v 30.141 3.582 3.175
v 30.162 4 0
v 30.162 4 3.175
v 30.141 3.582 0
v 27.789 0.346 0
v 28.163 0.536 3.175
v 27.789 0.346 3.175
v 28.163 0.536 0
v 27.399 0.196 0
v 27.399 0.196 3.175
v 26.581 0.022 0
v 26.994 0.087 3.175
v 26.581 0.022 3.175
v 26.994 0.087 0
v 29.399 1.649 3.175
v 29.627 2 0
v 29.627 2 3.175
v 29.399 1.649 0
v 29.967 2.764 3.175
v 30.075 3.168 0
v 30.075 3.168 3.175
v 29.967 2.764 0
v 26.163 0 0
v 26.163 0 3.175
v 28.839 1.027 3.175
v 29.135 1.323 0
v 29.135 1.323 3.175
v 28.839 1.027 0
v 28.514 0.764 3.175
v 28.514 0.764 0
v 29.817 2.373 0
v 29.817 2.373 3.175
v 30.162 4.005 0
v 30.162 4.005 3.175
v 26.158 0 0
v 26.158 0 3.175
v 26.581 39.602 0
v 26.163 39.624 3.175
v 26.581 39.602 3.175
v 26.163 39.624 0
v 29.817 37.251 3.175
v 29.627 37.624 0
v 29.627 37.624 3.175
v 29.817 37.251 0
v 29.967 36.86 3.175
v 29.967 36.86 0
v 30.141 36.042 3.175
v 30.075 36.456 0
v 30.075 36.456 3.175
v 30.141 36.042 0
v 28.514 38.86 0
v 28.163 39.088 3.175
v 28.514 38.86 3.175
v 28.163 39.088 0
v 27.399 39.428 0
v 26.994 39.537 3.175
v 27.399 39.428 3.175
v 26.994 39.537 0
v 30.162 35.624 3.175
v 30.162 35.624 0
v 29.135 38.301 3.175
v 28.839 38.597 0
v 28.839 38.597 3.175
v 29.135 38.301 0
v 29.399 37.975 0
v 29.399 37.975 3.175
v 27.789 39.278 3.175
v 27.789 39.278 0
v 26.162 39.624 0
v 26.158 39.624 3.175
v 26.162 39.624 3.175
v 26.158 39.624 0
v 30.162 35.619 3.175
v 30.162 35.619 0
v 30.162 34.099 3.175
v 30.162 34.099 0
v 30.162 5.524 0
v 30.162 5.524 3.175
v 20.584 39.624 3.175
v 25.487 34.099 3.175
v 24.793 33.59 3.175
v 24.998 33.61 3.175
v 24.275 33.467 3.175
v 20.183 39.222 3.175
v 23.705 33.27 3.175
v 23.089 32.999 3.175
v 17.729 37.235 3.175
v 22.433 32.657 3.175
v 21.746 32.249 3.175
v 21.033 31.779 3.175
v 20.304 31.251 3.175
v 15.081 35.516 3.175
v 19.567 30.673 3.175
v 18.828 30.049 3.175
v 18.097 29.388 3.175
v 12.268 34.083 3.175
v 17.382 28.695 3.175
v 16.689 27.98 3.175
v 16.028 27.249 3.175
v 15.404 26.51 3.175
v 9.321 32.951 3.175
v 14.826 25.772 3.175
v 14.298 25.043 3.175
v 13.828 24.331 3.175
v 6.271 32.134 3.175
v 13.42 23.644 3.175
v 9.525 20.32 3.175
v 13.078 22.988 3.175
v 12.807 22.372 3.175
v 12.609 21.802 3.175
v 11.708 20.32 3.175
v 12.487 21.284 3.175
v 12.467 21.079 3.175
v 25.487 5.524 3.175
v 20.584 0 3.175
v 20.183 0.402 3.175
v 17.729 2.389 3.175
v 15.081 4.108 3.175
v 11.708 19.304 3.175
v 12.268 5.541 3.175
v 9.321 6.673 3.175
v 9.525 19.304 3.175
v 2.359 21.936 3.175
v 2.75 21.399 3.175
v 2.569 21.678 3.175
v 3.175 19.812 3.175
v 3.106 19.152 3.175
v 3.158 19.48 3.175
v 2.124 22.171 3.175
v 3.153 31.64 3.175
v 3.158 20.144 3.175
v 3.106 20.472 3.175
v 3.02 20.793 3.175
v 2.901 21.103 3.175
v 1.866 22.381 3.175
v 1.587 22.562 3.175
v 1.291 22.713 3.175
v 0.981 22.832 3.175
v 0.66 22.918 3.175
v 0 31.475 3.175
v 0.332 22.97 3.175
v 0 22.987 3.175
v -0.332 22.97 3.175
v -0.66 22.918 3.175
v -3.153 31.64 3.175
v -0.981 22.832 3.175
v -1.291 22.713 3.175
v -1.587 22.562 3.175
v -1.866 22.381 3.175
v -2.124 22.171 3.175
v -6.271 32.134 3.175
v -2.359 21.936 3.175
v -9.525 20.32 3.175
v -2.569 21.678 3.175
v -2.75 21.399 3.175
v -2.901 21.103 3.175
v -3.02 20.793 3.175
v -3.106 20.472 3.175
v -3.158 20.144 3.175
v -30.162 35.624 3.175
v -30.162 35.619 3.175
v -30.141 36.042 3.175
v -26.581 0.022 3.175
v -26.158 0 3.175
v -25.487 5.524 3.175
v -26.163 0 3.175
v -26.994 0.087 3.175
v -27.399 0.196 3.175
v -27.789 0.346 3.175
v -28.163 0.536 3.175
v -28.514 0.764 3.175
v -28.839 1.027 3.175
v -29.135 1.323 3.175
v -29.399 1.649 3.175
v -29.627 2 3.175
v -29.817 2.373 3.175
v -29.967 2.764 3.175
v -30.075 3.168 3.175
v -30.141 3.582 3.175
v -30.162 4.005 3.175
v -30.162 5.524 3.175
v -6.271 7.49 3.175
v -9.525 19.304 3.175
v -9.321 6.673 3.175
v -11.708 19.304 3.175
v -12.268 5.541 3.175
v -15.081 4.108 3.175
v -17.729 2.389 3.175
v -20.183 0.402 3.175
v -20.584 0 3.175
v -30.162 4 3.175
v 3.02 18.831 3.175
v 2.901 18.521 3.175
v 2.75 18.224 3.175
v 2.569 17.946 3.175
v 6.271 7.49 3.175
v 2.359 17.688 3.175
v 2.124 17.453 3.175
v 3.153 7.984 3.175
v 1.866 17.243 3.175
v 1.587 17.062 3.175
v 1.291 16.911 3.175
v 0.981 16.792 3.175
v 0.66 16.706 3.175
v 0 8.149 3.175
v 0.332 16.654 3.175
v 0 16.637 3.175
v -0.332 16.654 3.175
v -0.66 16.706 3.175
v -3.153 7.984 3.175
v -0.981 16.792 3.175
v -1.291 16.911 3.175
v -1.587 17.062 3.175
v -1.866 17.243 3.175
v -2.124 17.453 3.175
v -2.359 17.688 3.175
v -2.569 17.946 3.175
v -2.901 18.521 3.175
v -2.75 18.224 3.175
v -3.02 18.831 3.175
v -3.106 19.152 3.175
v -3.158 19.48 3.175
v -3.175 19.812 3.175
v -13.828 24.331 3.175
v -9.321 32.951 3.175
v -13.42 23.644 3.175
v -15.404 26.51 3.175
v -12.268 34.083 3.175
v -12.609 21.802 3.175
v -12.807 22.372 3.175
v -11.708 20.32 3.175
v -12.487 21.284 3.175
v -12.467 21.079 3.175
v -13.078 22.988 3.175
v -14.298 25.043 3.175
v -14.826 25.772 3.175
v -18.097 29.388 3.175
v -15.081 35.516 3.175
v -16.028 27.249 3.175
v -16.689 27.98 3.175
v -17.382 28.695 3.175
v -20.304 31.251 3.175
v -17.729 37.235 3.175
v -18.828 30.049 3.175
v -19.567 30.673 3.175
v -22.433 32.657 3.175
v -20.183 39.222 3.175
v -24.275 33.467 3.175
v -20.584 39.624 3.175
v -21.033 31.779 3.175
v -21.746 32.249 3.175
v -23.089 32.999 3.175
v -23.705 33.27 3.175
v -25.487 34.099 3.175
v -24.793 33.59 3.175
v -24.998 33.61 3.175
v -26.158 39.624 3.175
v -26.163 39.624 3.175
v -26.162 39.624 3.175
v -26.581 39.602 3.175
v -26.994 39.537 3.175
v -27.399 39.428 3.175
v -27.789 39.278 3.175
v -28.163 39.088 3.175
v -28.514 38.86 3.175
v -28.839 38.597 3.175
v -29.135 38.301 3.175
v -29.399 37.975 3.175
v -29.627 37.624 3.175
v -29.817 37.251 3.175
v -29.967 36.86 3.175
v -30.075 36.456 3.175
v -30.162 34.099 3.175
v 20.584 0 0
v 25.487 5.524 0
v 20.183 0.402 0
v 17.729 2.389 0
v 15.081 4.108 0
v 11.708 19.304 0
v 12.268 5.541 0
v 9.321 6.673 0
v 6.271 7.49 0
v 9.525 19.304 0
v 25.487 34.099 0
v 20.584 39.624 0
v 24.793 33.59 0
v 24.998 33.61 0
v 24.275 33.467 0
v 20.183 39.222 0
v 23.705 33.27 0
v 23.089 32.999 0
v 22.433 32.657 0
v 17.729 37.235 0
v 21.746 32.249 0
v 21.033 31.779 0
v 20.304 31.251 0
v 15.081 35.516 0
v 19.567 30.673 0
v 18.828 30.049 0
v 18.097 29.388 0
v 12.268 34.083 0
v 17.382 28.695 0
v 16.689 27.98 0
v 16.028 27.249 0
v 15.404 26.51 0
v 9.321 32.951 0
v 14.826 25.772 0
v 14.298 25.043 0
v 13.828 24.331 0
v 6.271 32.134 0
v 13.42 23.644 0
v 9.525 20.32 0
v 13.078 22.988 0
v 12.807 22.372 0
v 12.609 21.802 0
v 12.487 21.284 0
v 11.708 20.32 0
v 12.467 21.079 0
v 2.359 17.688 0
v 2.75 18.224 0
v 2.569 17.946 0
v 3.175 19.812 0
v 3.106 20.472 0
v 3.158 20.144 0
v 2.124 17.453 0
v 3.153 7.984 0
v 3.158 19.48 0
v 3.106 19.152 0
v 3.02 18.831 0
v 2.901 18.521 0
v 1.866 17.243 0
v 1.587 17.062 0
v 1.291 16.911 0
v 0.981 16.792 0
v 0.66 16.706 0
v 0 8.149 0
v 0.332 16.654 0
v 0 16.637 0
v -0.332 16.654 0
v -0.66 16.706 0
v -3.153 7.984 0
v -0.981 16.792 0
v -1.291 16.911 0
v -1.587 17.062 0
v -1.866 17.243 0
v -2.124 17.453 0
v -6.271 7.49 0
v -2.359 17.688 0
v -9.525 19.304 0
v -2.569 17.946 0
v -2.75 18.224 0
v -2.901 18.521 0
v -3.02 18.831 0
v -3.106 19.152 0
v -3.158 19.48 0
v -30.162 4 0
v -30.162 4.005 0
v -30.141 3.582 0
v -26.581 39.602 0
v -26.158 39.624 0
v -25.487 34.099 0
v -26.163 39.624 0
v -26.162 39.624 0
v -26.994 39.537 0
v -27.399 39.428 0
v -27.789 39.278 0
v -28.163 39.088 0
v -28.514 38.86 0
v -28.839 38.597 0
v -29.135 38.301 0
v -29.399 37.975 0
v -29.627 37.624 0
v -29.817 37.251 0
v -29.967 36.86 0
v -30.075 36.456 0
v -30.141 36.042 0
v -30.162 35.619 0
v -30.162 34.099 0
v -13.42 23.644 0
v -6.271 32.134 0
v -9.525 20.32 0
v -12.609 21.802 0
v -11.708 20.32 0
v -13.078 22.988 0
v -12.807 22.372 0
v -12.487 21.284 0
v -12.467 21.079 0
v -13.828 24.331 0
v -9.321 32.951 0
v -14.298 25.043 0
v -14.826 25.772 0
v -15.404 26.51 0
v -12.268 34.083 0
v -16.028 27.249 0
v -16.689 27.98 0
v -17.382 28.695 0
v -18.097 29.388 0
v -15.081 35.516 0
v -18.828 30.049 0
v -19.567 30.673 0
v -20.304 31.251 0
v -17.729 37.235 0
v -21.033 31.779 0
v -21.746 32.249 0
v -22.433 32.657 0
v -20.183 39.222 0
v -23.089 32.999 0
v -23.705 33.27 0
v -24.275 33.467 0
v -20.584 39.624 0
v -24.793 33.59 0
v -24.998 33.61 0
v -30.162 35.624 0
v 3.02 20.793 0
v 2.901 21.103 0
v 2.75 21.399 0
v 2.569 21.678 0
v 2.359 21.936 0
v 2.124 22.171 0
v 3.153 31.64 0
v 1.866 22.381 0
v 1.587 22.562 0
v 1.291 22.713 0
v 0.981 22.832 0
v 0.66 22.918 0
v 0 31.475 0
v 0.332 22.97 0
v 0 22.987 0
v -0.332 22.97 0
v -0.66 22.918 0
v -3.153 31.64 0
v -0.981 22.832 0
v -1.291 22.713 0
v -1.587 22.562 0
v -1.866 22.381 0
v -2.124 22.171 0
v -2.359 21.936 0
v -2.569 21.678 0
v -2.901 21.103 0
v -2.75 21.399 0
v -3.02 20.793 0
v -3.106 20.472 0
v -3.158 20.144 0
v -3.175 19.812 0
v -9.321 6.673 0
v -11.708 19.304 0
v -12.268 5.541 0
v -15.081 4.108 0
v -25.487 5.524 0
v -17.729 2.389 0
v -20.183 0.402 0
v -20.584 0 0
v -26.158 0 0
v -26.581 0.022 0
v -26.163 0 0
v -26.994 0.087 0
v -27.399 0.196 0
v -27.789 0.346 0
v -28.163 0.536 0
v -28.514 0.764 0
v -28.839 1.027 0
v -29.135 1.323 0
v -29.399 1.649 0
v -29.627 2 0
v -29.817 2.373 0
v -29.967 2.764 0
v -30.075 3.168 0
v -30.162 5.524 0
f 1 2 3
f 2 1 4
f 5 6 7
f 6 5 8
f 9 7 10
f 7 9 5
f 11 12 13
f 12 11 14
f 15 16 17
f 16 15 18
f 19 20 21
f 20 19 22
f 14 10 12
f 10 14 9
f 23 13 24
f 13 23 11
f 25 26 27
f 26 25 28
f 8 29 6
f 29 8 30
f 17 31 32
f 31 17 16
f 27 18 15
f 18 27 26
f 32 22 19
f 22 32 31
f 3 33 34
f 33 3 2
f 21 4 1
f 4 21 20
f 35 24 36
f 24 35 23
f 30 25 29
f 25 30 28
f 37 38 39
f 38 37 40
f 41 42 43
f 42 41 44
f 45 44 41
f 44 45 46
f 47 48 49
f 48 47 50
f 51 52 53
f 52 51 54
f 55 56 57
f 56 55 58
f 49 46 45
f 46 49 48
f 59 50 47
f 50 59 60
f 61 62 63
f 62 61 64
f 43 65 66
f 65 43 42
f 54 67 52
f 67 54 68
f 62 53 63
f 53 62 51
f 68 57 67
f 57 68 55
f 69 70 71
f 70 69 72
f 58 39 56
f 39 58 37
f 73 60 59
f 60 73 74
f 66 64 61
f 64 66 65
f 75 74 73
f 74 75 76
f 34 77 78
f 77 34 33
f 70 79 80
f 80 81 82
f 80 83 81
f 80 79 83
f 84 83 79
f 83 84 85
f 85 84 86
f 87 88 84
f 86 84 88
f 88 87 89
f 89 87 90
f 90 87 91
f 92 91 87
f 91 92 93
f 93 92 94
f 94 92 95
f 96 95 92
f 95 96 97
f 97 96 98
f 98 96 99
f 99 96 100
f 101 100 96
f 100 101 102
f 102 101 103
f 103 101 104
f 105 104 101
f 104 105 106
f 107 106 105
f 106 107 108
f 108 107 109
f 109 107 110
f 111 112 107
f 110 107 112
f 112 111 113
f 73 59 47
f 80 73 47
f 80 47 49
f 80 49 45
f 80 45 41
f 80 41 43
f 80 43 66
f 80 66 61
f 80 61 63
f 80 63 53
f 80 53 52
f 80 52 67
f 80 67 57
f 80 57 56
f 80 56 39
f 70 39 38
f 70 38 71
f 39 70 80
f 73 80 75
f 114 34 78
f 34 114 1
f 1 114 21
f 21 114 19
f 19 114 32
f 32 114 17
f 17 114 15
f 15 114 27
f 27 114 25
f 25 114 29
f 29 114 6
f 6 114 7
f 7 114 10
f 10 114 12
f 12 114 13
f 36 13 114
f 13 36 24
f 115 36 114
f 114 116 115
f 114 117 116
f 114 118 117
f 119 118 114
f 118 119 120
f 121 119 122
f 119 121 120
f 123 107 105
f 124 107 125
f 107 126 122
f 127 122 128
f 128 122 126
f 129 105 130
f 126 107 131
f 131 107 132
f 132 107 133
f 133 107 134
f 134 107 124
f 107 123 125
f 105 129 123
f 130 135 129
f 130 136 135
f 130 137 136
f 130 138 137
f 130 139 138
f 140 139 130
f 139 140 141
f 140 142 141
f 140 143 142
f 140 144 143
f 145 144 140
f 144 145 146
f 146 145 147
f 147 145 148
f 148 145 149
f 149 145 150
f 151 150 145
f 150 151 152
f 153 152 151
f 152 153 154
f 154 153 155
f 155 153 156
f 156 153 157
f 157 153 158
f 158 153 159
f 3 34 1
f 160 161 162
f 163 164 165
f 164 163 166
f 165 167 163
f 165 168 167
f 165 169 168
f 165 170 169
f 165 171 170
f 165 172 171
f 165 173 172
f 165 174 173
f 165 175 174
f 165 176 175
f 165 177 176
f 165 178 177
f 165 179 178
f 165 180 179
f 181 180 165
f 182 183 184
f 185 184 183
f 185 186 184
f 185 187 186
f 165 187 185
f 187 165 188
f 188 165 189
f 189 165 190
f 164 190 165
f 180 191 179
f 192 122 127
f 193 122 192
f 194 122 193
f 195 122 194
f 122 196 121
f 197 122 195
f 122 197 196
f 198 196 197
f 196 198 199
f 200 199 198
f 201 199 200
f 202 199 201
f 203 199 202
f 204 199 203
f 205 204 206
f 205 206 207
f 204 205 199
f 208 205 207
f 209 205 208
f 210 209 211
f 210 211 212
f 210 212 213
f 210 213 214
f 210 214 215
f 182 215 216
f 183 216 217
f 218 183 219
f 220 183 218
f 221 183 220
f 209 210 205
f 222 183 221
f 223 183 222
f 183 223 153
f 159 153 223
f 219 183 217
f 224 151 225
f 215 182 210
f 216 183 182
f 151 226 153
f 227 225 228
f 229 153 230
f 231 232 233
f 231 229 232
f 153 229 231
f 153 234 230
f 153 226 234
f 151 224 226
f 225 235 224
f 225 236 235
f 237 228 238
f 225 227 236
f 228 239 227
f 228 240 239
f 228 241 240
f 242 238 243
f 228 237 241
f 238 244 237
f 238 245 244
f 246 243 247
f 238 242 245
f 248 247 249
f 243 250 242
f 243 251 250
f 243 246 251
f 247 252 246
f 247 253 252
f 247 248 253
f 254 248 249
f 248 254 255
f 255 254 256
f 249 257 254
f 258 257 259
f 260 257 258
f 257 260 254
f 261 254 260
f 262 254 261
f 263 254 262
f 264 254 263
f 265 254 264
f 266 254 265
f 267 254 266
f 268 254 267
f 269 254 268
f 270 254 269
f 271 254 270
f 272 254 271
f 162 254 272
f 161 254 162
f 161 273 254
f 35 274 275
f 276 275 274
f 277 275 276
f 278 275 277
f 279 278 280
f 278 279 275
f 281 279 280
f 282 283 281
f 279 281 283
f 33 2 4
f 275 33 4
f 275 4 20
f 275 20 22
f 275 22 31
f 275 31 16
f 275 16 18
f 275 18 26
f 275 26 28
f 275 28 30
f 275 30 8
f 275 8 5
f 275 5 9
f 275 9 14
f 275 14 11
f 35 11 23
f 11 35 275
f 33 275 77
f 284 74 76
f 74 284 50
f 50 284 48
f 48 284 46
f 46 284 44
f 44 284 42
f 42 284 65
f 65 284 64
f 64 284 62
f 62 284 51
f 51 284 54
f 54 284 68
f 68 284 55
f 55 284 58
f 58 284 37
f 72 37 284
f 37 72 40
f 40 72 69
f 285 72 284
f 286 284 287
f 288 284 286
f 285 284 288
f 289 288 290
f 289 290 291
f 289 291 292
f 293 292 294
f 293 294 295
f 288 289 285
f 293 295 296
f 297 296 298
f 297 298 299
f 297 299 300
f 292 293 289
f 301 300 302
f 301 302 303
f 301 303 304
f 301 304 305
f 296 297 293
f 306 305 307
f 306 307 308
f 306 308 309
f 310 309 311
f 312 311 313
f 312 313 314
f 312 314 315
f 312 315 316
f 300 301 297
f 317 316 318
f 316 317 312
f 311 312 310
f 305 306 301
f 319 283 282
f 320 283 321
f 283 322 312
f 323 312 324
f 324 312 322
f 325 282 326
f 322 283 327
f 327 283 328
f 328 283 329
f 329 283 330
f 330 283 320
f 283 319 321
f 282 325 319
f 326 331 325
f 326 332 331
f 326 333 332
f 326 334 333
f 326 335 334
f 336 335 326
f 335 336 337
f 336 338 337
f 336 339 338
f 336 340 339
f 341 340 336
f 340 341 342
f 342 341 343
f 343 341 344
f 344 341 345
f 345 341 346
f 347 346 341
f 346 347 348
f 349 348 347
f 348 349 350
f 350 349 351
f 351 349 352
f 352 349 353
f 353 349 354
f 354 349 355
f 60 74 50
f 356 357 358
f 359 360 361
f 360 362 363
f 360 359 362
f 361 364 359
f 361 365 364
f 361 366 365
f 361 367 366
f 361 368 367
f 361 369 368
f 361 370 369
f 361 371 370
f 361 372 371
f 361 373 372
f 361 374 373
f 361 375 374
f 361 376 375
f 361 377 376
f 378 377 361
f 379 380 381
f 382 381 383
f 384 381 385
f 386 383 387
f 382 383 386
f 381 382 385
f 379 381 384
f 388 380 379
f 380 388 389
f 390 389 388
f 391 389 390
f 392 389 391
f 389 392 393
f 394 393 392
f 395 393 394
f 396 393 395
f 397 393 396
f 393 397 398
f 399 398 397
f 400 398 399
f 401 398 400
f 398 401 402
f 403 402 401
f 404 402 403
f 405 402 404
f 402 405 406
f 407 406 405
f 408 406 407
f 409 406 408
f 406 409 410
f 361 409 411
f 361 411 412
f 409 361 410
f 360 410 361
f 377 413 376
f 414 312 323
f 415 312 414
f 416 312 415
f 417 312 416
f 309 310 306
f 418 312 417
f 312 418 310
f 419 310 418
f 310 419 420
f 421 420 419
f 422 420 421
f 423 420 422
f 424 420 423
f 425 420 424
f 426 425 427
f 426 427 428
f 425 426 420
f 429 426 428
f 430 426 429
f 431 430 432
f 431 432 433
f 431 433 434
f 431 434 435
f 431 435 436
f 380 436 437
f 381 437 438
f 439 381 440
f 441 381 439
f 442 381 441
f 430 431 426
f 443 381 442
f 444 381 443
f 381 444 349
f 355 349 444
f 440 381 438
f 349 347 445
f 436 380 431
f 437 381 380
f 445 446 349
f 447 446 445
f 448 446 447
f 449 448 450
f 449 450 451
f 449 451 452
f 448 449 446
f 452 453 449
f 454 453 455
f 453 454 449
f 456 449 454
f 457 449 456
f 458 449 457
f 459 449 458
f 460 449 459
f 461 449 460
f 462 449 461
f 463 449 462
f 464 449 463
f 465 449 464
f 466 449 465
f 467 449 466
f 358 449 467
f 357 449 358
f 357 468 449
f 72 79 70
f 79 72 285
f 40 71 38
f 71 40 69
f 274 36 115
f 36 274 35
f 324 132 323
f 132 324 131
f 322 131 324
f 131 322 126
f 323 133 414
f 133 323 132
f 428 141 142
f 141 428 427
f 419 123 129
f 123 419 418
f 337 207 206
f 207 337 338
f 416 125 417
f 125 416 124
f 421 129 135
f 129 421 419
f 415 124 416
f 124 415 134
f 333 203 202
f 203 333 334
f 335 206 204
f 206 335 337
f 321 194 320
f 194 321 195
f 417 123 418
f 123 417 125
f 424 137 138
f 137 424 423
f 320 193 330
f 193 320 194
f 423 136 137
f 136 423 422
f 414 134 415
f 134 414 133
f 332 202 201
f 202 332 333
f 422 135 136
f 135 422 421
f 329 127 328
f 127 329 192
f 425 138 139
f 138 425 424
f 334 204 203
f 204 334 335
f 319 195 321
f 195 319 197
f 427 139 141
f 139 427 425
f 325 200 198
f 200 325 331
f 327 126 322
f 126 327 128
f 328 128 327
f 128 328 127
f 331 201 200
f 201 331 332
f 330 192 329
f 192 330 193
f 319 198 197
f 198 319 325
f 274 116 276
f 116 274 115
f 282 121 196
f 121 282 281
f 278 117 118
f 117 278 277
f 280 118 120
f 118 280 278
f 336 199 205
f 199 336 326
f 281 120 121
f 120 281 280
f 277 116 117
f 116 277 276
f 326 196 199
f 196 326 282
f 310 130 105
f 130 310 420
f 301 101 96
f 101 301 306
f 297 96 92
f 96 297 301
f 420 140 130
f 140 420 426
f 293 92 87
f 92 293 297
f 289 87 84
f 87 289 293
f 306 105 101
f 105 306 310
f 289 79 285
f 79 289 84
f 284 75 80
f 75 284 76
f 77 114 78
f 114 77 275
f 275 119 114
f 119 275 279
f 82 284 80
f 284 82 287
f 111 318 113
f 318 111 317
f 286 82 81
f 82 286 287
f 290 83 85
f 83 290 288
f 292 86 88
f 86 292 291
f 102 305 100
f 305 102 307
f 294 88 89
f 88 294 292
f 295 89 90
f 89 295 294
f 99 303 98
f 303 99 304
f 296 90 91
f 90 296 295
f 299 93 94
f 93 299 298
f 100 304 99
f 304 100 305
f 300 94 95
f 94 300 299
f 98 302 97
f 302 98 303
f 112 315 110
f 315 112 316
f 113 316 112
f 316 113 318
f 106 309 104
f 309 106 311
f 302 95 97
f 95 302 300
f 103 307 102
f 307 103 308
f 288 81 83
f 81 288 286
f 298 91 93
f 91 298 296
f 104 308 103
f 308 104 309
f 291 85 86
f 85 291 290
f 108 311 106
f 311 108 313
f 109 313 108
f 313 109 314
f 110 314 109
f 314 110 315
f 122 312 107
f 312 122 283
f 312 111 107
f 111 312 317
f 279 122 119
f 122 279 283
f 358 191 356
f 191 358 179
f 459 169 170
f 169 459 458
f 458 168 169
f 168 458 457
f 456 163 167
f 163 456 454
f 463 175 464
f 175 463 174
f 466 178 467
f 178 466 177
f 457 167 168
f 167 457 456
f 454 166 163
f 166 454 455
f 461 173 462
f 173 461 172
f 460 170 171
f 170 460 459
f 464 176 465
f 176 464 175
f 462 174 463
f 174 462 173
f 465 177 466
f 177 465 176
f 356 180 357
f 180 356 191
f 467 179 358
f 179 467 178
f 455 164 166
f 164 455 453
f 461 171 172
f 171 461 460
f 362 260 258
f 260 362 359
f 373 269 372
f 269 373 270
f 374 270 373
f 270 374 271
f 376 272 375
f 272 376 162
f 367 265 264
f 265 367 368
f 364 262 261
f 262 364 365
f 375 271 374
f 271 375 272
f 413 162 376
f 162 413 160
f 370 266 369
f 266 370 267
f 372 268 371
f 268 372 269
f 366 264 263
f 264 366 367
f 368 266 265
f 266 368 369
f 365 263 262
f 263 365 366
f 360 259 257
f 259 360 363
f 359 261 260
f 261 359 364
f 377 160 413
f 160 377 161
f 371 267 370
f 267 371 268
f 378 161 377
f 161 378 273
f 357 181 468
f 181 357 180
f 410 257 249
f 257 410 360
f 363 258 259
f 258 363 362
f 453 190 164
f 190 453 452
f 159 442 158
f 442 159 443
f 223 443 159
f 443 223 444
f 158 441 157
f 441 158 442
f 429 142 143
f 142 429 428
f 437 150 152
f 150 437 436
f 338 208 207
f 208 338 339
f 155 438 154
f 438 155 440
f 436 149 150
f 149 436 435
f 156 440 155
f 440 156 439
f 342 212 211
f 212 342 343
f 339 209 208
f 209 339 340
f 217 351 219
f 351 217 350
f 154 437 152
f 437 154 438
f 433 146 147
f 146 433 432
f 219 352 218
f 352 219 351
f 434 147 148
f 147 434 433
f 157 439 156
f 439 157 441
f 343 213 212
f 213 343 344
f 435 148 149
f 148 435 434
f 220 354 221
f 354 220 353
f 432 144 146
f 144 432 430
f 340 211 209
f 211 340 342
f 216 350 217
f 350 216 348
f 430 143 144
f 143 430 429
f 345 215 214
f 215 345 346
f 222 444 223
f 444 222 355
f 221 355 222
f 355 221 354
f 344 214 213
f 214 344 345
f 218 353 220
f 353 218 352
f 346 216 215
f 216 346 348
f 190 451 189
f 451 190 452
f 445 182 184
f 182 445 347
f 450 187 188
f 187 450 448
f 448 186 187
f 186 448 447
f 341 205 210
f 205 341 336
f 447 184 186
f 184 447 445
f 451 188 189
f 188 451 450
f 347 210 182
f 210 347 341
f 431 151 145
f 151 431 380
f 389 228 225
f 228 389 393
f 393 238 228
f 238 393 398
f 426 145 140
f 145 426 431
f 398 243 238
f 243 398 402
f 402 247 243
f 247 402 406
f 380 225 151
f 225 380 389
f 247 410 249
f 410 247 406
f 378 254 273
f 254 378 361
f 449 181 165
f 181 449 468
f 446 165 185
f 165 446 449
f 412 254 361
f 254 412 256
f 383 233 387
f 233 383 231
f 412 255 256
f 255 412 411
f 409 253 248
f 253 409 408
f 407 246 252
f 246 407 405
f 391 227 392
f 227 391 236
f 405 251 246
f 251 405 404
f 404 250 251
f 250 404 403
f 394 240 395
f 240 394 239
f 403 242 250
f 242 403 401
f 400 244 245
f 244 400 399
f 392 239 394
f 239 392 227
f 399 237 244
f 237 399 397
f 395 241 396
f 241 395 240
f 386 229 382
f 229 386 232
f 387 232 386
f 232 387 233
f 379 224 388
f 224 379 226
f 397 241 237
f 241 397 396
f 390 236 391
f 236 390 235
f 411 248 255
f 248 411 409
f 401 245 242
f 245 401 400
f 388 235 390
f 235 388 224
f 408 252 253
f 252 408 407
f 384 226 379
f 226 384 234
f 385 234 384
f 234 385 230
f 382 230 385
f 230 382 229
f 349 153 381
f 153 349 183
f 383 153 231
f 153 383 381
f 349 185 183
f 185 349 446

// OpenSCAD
s = 25.4;

center_hole_rad = .25*s;
thick = 1/8*s;
total_width = 2.375*s;
width = total_width/2;
length = 1.56*s;
side_cut_width = 0.188*s;
side_cut_length = 1.125*s;
flex_cut_width = 0.125*s;
flex_cut_length = 0.04*s;
flex_cut_pos = 0.5*s;
cut_width = 0.375*s;
cut_height = 1.125*s;
tri_cut_width = 1.0*s;
tri_cut_height = 0.125*s;
side_fillet_rad = 4.0;
edge_fillet_rad = 2.0;

// Set the angular resolution ($fn segments per 360 deg)
$fn = 60;

module fillet(r, h) {
    translate([r / 2, r / 2, 0])
    difference() {
        cube([r + 0.01, r + 0.01, h], center = true);
        translate([r/2, r/2, 0])
          cylinder(r = r, h = h + 1, center = true);
    }
}

module oval(w, h, height, center = false) {
  scale([1, h/w, 1]) cylinder(h=height, r=w, center=center);
}

module strut_half(){
difference(){
    // Main box
    cube([width, length, thick]);

    translate([0, length/2, -0.1])
        cylinder(r=center_hole_rad/2, h=thick*1.2);

    translate([0, -length/1.8, -0.1])
        cylinder(r=width, h=thick*1.2);
    translate([0, length+length/1.8, -0.1])
        cylinder(r=width, h=thick*1.2);

    translate([width-side_cut_width+.1, (length-side_cut_length)/2, -0.1])
        cube([side_cut_width+.1, side_cut_length, thick+0.2]);

    translate([width-side_cut_width+.1, (length-side_cut_length)/2, -0.1])
		rotate(a=[0,0,45])
			cube([side_cut_length/sqrt(2), side_cut_length/sqrt(2), thick+0.2]);

    rotate(a=[0,0,45])
    		translate([width/2+17.5, 5, -0.1])
			oval(side_cut_length/3, 3, thick+0.2, false);

    translate([flex_cut_pos-flex_cut_width, (length-flex_cut_length)/2, -0.1])
        cube([flex_cut_width, flex_cut_length, thick+0.2]);

    // holes
    //for (x=[-1,0,1], y=[-1,0,1] ){
    //    translate([x*hole_size*2+width/2, y*hole_size*2+length/2+trans_base/2, -0.1])
    //      cylinder(r=hole_size/2, h=box_height);
    //}

    // fillets for the side edges
    translate([width,0,-0.1])
      rotate(a=[0,0,90])
        fillet(side_fillet_rad, thick*3);
    translate([width,length,-0.1])
      rotate(a=[0,0,180])
        fillet(side_fillet_rad, thick*3);

}
}

translate([0,0,0]) strut_half();

mirror([1, 0, 0]) translate([0,0,0]) strut_half();

        
